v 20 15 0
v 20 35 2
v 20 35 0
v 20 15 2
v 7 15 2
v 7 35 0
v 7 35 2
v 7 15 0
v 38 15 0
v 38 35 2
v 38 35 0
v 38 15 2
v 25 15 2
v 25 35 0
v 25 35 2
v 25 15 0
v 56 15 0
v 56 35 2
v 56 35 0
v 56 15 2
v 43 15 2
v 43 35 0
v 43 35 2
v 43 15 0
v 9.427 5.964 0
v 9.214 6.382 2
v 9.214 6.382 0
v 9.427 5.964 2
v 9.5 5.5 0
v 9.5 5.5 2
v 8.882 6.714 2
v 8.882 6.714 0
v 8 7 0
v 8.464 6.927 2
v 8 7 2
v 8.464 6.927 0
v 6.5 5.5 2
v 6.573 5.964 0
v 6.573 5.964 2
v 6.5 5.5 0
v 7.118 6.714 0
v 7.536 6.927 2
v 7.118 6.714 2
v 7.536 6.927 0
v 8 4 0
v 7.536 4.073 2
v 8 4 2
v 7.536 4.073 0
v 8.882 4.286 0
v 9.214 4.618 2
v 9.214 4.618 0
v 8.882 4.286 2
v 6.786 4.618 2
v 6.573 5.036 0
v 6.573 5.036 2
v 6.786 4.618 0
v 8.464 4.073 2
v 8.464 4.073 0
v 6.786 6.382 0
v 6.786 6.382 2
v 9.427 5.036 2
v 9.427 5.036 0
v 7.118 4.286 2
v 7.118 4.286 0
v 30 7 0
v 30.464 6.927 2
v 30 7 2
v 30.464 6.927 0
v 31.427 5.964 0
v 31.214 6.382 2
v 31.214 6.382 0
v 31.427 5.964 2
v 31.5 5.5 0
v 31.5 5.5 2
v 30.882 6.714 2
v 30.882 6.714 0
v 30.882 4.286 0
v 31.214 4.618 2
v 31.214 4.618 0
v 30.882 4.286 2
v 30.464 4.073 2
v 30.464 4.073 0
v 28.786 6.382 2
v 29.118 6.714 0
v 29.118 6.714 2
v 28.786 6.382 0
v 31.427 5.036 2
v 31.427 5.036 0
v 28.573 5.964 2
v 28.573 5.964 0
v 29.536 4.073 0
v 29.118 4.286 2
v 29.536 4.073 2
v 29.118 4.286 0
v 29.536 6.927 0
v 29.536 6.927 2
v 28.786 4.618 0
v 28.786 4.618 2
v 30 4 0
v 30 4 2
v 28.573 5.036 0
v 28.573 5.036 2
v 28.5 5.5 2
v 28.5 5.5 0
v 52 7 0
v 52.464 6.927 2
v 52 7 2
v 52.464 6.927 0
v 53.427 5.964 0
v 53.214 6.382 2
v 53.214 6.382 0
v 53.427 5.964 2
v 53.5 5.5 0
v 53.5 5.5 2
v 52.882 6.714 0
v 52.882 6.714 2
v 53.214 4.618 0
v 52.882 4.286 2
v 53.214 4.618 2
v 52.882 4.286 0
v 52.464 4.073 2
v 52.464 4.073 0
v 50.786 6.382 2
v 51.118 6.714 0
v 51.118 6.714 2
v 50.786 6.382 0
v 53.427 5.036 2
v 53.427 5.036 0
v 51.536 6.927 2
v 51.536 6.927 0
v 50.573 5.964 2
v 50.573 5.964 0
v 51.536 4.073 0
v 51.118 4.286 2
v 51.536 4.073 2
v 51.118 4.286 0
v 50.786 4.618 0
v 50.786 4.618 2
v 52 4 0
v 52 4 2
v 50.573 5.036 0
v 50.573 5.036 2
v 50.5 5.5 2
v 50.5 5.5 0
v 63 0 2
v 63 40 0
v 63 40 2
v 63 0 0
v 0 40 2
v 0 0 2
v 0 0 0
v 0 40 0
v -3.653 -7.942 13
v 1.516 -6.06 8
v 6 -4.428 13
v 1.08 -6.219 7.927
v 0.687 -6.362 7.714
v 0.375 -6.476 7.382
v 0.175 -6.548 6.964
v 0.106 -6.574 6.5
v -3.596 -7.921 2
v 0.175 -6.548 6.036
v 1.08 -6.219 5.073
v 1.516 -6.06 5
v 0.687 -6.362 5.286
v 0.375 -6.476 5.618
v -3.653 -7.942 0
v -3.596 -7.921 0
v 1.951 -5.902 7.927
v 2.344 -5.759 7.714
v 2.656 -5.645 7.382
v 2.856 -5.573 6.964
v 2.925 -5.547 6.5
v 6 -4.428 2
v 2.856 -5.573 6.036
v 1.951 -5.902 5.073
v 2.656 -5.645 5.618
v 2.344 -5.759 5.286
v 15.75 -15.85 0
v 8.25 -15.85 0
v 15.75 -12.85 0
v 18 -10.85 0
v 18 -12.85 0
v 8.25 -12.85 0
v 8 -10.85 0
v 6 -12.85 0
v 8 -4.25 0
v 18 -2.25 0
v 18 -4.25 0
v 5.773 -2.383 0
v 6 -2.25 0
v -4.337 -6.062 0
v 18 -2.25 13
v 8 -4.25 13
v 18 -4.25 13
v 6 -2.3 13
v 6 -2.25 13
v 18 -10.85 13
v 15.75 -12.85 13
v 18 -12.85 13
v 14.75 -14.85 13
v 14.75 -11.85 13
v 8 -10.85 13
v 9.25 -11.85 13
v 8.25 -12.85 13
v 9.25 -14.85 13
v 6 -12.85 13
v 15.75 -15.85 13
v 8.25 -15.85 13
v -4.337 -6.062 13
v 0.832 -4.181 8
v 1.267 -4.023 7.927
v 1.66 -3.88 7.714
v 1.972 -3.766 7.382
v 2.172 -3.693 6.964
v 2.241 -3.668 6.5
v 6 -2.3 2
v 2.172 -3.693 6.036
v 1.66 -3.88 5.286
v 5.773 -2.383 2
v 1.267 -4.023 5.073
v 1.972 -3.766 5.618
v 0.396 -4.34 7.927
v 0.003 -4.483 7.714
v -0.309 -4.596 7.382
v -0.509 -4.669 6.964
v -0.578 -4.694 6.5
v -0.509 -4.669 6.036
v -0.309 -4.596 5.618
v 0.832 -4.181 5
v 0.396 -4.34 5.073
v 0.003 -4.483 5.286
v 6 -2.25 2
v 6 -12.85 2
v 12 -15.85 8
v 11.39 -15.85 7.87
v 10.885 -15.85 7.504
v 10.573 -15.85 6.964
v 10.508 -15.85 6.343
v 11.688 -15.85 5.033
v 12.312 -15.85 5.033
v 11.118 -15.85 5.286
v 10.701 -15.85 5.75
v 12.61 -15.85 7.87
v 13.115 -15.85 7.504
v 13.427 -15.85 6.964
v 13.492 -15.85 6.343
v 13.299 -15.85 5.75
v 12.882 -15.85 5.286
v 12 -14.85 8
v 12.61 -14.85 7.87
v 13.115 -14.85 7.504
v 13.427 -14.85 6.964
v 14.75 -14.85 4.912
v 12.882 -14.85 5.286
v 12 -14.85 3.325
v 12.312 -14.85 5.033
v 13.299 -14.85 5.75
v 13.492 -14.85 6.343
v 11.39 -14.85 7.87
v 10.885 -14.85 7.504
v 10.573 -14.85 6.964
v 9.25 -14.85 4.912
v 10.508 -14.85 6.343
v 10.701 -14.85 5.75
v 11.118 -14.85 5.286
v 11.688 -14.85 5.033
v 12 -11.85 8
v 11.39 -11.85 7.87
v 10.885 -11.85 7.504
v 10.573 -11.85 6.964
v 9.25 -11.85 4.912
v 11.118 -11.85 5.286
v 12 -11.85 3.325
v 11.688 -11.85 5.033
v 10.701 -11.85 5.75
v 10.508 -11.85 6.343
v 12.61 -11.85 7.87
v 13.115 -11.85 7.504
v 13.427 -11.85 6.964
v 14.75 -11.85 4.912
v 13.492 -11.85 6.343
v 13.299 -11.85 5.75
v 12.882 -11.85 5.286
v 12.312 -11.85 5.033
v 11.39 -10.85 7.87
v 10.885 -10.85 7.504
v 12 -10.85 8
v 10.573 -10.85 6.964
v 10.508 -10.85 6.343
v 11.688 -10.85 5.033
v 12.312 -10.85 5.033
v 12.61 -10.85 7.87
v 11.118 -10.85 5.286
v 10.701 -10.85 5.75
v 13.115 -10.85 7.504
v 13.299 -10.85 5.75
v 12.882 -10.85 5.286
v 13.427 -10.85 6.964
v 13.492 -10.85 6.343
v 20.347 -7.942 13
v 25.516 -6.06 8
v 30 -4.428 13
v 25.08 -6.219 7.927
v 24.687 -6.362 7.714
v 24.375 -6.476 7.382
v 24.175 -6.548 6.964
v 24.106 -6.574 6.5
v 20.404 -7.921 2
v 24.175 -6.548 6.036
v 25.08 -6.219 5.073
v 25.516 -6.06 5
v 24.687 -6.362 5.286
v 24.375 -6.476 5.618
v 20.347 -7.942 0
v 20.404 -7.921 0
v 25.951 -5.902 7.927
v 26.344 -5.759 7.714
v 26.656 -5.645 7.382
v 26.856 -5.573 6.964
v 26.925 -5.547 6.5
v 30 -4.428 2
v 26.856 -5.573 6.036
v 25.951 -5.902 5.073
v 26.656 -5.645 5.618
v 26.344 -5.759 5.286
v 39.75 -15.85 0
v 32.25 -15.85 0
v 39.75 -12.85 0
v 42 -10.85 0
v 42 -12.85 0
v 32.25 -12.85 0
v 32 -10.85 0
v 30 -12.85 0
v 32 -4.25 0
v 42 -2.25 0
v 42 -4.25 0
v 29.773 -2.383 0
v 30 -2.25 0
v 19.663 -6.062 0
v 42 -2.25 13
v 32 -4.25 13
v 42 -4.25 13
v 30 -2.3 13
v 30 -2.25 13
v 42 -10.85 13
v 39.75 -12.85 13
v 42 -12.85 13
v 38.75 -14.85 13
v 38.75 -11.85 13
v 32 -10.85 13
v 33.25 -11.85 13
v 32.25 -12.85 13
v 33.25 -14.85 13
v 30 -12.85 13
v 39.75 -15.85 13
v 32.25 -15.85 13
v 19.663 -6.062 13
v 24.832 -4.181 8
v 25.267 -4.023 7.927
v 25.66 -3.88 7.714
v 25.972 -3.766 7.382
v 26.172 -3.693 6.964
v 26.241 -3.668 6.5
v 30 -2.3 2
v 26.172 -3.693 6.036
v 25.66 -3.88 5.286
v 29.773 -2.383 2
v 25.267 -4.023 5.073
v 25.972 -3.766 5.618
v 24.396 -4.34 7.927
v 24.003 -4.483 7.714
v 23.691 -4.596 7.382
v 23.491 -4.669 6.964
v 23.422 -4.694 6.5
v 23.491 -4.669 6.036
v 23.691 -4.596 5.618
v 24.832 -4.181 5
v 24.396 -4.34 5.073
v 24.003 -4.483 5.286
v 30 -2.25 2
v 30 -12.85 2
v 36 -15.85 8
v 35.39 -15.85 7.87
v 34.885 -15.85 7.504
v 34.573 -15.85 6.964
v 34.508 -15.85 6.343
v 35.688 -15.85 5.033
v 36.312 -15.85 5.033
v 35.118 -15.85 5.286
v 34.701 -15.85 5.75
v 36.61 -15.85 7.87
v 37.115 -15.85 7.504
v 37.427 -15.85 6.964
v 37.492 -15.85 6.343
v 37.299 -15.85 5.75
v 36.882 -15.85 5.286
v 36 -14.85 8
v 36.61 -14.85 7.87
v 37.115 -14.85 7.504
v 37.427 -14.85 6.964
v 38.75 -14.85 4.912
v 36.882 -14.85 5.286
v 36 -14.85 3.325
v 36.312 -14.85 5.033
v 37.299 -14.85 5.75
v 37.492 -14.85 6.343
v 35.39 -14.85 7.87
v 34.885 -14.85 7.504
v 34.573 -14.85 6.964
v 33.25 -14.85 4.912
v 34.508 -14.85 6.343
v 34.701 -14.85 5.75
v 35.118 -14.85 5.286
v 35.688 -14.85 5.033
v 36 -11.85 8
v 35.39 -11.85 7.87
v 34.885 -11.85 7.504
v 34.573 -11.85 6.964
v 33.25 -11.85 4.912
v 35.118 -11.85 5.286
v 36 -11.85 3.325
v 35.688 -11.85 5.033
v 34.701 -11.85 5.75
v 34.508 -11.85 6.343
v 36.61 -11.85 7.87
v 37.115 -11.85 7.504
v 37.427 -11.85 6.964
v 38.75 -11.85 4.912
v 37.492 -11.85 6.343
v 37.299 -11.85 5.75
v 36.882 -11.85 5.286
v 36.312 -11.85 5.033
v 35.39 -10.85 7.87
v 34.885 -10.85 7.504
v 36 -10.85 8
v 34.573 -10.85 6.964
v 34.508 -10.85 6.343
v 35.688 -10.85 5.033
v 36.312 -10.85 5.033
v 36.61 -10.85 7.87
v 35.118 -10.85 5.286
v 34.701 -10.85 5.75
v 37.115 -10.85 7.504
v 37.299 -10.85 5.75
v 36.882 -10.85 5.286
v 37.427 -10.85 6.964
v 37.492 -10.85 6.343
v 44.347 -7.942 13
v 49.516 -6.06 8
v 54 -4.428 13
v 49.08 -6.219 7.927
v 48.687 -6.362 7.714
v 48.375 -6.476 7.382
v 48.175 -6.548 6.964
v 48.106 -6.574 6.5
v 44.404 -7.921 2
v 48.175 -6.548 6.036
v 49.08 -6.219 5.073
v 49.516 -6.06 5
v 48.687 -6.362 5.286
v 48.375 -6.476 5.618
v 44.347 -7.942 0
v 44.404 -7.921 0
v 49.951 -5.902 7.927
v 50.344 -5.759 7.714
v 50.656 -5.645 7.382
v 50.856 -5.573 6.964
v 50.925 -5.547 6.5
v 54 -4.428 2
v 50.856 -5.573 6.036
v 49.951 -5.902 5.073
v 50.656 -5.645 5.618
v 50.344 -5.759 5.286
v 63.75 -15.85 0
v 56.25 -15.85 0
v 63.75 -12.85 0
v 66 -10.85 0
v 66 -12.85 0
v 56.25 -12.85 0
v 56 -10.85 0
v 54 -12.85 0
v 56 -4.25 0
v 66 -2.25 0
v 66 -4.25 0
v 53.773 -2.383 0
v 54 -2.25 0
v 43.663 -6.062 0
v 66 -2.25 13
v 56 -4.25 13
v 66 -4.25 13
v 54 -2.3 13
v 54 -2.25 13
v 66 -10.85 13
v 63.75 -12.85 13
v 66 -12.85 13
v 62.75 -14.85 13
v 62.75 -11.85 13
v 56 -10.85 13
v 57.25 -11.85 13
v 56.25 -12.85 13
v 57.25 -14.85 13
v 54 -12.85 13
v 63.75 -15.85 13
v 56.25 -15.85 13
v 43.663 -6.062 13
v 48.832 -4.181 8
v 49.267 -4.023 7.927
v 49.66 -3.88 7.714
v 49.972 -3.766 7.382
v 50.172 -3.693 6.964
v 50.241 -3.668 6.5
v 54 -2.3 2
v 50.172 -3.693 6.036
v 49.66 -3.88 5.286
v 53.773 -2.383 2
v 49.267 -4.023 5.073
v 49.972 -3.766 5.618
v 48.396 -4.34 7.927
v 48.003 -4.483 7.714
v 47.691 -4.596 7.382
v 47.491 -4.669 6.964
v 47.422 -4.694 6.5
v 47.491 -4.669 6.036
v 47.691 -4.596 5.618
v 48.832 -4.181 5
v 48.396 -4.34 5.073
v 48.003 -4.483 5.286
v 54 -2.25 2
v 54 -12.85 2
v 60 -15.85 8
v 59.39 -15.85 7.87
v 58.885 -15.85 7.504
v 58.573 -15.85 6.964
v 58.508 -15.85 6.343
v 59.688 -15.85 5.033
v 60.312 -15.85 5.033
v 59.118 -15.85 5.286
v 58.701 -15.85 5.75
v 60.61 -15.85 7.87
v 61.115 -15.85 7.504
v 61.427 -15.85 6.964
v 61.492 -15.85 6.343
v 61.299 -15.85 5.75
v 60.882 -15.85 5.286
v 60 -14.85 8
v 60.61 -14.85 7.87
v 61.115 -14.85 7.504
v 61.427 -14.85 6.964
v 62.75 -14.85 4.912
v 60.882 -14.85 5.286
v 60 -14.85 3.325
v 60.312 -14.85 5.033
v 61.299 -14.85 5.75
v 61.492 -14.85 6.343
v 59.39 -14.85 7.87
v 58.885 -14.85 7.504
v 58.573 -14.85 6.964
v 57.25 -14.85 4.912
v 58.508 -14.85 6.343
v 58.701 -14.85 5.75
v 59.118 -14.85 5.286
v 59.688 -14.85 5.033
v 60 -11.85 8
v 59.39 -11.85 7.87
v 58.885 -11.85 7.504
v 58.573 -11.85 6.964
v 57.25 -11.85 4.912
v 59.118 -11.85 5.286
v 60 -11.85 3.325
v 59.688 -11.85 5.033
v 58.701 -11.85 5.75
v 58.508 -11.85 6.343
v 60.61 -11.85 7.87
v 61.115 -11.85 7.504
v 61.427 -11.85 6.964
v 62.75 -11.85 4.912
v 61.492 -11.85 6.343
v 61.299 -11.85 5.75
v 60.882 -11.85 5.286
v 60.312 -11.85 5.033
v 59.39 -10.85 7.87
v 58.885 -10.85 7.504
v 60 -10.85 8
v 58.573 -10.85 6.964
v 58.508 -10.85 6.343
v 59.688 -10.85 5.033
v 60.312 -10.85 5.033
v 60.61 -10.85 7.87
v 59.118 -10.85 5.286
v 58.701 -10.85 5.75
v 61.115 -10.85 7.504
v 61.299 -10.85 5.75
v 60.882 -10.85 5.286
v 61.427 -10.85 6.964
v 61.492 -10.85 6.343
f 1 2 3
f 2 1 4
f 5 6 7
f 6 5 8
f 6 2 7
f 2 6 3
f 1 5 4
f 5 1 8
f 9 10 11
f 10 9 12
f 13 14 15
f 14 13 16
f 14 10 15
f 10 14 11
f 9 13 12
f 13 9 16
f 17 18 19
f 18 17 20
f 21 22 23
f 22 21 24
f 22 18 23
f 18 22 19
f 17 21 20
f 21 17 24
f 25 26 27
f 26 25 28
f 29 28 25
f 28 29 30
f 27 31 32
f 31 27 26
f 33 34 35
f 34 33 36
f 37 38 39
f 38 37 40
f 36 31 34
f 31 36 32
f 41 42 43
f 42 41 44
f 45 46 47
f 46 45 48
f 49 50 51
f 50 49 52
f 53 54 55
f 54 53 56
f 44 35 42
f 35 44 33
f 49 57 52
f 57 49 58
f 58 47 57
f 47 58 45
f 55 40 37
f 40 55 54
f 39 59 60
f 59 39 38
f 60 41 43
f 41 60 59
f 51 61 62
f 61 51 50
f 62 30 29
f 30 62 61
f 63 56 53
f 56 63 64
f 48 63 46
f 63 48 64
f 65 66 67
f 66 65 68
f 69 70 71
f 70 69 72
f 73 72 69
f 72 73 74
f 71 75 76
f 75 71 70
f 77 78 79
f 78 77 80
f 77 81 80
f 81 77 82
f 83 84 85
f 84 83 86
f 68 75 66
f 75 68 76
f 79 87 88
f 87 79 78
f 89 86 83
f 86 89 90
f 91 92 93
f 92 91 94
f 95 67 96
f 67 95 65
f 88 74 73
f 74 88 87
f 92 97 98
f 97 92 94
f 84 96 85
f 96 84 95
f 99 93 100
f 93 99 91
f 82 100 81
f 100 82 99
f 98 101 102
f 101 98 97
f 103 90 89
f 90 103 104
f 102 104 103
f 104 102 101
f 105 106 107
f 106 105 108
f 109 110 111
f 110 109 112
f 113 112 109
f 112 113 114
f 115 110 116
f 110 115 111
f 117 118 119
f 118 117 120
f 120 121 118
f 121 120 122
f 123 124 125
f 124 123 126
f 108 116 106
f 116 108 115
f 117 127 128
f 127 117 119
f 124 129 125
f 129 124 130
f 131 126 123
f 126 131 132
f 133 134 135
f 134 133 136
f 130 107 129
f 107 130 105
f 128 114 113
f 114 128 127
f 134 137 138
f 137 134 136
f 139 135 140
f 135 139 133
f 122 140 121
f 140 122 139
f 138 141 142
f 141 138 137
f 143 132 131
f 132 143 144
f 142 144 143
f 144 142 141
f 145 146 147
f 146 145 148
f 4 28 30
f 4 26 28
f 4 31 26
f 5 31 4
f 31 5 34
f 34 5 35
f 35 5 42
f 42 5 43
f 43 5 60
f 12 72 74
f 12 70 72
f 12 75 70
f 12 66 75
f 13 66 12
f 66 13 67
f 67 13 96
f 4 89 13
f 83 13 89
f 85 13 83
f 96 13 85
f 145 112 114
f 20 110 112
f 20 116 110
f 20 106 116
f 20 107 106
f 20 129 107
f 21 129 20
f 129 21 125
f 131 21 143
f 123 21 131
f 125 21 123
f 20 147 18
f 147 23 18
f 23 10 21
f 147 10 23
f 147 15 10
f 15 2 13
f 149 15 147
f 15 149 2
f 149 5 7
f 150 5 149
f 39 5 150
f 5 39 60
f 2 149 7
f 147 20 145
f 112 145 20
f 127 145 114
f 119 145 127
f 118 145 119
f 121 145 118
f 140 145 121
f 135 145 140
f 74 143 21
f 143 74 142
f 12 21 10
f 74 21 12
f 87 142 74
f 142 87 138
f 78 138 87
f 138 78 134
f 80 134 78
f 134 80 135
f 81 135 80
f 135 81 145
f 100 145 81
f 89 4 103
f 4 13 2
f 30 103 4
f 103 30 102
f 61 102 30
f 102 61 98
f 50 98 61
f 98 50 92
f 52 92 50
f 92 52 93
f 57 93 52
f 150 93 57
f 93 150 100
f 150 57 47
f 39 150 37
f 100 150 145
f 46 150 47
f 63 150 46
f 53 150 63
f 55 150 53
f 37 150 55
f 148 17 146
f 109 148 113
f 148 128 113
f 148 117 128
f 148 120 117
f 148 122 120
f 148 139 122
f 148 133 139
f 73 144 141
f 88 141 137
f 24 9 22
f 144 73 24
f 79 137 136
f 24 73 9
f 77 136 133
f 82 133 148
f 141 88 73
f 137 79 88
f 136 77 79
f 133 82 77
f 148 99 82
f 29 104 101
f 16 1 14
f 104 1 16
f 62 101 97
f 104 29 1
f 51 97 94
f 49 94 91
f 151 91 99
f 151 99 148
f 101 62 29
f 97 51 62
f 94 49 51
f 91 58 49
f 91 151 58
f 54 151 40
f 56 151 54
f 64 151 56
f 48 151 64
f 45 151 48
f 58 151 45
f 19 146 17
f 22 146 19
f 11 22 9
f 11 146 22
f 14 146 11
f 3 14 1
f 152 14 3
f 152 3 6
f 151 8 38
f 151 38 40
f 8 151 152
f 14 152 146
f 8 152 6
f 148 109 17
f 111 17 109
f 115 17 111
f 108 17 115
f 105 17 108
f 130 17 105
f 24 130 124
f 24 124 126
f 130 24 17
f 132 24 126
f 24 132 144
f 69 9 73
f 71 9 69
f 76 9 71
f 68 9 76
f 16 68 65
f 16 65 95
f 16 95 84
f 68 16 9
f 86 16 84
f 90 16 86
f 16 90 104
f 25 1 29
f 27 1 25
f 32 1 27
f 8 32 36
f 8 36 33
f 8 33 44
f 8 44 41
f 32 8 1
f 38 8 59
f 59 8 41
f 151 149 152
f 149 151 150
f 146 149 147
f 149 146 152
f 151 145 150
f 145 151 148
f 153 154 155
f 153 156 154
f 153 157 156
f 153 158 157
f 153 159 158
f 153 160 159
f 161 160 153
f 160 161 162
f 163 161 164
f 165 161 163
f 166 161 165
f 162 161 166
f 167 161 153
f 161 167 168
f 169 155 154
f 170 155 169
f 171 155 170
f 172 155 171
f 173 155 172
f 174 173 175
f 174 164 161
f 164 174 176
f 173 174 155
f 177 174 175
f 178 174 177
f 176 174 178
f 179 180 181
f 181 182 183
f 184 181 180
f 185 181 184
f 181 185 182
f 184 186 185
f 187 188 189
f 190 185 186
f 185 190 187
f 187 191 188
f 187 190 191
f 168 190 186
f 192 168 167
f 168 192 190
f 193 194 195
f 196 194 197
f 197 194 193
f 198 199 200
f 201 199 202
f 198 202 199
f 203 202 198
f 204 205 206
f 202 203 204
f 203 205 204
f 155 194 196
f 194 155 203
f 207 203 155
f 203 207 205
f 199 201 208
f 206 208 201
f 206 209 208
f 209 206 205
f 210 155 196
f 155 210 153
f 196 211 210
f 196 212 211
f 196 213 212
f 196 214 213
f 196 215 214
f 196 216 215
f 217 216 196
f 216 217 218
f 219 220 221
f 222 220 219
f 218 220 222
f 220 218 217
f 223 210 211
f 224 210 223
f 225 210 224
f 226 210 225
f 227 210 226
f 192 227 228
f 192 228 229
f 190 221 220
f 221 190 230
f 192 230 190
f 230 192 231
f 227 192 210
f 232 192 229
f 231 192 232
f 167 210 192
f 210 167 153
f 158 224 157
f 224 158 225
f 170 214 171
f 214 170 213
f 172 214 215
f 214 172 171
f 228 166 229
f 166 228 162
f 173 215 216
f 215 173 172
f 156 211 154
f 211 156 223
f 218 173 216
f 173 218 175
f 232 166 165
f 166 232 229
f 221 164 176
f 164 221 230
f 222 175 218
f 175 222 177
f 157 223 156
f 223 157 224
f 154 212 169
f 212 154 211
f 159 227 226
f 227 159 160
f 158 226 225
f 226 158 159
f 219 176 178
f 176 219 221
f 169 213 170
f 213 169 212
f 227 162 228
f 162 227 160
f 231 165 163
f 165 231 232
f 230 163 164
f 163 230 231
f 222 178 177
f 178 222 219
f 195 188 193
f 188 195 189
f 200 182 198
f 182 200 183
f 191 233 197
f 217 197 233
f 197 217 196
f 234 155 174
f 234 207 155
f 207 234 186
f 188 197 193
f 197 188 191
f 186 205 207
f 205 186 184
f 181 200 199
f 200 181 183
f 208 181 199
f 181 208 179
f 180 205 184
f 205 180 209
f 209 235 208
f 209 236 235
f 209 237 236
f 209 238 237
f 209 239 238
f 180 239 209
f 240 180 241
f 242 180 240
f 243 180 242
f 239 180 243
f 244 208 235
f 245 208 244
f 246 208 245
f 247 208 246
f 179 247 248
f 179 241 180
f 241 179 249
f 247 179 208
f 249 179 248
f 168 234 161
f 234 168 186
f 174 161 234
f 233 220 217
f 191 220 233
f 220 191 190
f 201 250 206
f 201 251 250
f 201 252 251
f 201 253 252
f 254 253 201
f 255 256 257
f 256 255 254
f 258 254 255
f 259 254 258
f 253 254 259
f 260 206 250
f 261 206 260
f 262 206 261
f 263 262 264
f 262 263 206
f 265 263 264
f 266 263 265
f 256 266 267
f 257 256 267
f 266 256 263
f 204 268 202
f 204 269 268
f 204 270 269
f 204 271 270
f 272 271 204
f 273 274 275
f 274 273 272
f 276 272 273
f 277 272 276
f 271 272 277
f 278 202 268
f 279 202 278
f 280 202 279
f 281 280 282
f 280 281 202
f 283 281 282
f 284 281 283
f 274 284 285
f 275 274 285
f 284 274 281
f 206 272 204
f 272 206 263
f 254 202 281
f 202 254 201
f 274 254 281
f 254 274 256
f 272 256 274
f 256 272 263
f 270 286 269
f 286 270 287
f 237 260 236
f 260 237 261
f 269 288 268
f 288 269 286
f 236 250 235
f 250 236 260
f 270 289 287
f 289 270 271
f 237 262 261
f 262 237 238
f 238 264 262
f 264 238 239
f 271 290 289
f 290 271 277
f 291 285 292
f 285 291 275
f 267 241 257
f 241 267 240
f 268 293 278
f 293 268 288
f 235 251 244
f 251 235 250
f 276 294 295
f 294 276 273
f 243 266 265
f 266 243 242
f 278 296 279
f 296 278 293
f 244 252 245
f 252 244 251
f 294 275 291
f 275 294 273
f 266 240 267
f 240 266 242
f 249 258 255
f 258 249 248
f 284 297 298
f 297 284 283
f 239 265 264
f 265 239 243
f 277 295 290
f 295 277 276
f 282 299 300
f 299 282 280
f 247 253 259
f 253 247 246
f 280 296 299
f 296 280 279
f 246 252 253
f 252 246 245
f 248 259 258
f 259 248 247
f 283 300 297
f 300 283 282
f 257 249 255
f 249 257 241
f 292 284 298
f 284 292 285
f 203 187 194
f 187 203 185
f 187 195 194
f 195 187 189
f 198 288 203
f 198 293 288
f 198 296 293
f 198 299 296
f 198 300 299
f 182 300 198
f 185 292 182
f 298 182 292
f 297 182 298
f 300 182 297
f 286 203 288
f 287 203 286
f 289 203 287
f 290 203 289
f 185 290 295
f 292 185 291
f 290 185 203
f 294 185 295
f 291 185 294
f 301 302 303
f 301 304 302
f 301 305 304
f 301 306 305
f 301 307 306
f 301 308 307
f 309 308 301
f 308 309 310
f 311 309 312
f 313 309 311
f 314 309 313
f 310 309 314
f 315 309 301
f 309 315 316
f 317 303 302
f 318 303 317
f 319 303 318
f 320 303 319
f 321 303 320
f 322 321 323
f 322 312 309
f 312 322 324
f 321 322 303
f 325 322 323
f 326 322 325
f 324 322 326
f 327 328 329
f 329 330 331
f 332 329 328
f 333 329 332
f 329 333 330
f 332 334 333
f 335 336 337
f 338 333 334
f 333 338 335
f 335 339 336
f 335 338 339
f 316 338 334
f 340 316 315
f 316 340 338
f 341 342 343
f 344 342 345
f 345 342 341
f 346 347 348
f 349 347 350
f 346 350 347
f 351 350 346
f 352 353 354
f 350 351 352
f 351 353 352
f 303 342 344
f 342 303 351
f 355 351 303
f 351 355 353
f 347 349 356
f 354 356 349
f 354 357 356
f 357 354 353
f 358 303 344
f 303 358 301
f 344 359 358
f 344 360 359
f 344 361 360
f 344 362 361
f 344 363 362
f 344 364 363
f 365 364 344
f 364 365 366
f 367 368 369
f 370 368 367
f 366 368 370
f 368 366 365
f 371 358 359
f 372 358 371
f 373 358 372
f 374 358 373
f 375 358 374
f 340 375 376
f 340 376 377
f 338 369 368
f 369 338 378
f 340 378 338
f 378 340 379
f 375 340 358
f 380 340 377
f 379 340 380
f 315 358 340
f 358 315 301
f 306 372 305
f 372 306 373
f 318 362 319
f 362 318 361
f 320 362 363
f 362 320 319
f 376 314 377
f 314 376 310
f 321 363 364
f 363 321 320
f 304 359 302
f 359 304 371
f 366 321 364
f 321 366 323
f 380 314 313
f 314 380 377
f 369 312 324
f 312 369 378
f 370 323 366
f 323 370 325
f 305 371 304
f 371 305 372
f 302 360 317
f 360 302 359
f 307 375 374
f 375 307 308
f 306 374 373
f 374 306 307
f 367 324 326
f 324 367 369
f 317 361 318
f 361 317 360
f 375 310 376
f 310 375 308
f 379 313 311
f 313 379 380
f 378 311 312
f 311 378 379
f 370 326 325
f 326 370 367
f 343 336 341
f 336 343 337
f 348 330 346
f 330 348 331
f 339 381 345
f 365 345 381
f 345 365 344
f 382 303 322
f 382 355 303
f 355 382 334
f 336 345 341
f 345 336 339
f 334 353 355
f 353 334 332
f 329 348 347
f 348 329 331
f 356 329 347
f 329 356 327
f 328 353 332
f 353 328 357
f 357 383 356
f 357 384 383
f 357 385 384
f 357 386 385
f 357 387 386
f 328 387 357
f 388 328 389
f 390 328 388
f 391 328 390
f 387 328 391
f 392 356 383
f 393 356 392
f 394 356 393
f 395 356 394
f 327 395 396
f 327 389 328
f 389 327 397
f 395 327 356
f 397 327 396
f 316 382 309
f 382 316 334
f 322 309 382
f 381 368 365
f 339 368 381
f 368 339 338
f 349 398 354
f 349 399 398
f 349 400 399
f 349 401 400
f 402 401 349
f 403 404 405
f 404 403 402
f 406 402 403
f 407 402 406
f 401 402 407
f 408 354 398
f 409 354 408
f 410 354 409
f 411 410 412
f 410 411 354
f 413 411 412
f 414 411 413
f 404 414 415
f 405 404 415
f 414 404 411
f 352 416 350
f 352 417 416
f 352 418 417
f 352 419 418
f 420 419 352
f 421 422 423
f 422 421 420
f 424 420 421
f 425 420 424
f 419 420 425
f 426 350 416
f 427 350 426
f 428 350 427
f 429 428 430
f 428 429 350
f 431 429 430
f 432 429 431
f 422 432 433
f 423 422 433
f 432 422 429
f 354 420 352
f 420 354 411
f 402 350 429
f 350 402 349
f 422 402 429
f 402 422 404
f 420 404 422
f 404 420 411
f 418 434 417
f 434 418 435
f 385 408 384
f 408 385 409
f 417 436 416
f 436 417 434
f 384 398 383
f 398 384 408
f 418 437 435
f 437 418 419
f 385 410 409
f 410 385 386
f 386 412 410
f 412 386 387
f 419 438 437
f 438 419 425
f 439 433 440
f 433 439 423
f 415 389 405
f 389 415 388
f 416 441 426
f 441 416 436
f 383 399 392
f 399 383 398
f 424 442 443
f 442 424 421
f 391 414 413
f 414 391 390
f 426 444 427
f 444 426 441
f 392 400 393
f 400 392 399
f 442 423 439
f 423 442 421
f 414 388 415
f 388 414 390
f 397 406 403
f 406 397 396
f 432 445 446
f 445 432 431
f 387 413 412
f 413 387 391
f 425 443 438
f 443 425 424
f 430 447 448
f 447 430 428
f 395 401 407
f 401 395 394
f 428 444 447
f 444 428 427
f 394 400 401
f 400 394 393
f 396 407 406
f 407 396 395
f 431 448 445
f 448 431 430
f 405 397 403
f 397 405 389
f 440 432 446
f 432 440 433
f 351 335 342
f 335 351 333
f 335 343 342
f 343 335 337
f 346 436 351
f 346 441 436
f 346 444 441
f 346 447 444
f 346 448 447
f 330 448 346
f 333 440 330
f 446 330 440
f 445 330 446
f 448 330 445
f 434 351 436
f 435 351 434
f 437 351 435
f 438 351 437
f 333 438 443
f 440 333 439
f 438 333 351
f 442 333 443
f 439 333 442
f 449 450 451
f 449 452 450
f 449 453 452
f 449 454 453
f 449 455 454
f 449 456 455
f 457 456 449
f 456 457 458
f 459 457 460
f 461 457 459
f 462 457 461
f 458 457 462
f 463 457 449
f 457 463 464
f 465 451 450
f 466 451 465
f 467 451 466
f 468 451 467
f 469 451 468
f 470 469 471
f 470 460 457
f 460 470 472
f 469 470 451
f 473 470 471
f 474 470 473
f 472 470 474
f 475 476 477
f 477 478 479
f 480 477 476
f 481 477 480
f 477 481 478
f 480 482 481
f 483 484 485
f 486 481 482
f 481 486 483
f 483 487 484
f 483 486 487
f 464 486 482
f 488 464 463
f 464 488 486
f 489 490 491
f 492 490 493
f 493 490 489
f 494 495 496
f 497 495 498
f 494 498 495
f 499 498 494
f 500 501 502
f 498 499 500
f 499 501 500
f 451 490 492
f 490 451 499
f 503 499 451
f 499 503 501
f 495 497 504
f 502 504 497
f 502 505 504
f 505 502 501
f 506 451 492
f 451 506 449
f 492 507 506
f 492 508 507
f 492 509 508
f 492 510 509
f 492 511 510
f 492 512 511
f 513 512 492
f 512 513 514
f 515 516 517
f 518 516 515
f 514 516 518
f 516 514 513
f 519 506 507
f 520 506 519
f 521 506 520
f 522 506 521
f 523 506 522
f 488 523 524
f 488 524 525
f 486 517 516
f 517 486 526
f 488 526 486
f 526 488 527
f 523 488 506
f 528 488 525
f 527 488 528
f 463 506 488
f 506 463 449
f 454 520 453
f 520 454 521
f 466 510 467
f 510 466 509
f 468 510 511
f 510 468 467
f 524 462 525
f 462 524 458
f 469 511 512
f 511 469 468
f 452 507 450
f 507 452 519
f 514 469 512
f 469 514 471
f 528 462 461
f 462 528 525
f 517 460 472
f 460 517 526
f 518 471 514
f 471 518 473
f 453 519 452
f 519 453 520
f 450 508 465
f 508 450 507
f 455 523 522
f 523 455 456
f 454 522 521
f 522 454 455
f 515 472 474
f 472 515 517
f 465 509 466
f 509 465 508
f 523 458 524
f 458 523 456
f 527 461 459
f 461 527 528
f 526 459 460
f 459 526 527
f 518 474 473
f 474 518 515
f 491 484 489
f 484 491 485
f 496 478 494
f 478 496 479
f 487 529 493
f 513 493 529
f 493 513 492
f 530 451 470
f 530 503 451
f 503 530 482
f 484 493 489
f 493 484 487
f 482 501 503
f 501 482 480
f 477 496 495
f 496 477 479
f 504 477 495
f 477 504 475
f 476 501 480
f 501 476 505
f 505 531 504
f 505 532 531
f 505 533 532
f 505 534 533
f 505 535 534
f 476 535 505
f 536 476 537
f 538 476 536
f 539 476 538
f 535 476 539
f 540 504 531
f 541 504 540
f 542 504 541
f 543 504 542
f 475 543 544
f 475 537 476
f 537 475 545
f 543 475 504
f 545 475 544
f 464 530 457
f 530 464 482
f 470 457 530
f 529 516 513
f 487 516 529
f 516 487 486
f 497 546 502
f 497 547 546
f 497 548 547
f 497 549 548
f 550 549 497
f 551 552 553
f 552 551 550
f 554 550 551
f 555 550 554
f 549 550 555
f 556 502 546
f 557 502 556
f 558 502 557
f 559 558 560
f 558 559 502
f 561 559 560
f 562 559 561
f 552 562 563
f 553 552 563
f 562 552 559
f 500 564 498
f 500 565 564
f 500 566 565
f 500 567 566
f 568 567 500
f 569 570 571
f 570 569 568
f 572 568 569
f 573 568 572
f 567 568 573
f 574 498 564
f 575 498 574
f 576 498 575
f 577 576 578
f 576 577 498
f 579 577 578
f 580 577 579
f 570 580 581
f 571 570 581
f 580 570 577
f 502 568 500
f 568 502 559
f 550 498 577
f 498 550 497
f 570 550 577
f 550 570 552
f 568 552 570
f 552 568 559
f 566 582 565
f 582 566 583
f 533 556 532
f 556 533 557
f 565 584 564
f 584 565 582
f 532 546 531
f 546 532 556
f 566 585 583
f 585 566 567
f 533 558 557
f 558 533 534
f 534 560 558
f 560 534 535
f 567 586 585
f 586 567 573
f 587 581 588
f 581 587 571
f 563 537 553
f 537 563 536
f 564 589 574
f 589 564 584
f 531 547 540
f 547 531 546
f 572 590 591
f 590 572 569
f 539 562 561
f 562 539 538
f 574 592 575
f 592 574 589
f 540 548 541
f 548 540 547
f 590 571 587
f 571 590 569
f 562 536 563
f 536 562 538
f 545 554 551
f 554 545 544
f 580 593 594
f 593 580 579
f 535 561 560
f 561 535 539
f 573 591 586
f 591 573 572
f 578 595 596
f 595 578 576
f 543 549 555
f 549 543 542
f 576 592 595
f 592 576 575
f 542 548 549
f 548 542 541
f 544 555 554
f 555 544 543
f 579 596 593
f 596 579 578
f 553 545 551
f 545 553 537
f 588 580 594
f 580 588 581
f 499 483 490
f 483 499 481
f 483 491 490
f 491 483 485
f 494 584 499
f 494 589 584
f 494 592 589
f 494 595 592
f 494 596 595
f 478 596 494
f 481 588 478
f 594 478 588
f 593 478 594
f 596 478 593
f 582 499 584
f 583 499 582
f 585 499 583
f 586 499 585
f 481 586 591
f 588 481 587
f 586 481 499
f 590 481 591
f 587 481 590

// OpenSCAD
/*
 * Rocker Switch Panel, v0.42
 *
 * by Alex Franke (CodeCreations), Feb 2014
 * http://www.theFrankes.com
 * 
 * Licenced under Creative Commons Attribution - Non-Commercial - Share Alike 3.0 
 * 
 * INSTRUCTIONS: Choose some values in the "User-defined values" section, and render. 
 * 
 * v1.00, Mar 7, 2014: Supports angles between 90-180, suggested by MyMakibox 
 * v0.42, Feb 1, 2014: Initial Release.
 */
 
/////////////////////////////////////////////////////////////////////////////
// User-defined values... 
/////////////////////////////////////////////////////////////////////////////
 
/* [General Properties] */

// The thickness of the material (switch panel, clip, etc)
thickness = 2;

// The in-diameter of mounting nut (flat to flat)
nutInDiameter = 5.5; 

// The height of the mounting nut
nutHeight = 2.5; 

// The diameter of the screw holes 
screwHoleDiameter = 3; 

// Curve quality
$fn = 20;


/* [Switch Properties] */

// How many rows of switches? 
rows = 1; 

// How many columns of switches? 
columns = 3; 

// The width of the switch opening
switchWidth = 13;

// The length of the switch opening
switchLength = 20; 


/* [Mounting Clip Properties] */

// The angle of the mounted panel 
angle = 70; 

// The number of mounting clips
mountingClips = 3; 

// The distance between the mounting clips and the edges of the panel 
mountingClipMargin = 3;

// The width of the clip that attaches to the board
clipWidth = 13;

// The thickness of the board you're mounting the clips onto
boardWidth = 6.6; 

// The length that the clips extend over the board
boardClampLength = 10; 

// The length of the extender tab that you mount the panel to
extenderLength = 11; 


/* [Spacing] */

// The amount of space between each column of switches (X direction) 
xSwitchPadding = 5;

// The amount of space between each row of switches (Y direction) 
ySwitchPadding = 6;

// The amount of space between the switches and the left and right edges of the panel
xMargin = 7;  

// The amount of space between the switches and the top and bottom edges of the panel
yMargin = 5;  

// How much space to leave for labels
labelPadding = 10; 

// Should label space go below the switch or above it?
labelBelow = true;


/////////////////////////////////////////////////////////////////////////////
// The code... 
/////////////////////////////////////////////////////////////////////////////

rockerSwitchPanel();

yOffset = ( angle < 90 ) ? 0 : extenderLength * cos(180-angle);

translate([
	(thickness+boardClampLength+extenderLength+1)/2,
	-((thickness*2+boardWidth+nutHeight)/2)-1 - yOffset,
	clipWidth/2
	]) 
for ( i=[0:mountingClips-1] ) {
	translate([(thickness+boardClampLength+extenderLength+1)*i,0,0]) 
	mount();
}


/////////////////////////////////////////////////////////////////////////////
// Modules... 
/////////////////////////////////////////////////////////////////////////////

module rockerSwitchPanel() {

	panelSize = [
		columns*switchWidth + xSwitchPadding*(columns-1) + xMargin*2,
		rows*(switchLength+labelPadding) + ySwitchPadding*(rows-1) + yMargin*2,
		thickness
		];
	clipSeperation = (panelSize[0] - 2*mountingClipMargin - mountingClips*clipWidth)
		/(mountingClips-1);

	union() {

		// mounting clips
*		translate([
			mountingClipMargin+boardClampLength/2,
			(thickness*2+boardWidth)/2,
			-(thickness+boardClampLength)/2
		]) 
		for ( i=[0:mountingClips-1] ) { 
			translate([i*(clipSeperation+clipWidth),0,0]) 
			rotate([0,90,180]) 
			mount(); 
		}

		// panel
		//	rotate([angle,0,0]) 
		difference() {
			cube(panelSize);
			
			translate([xMargin,yMargin+(labelBelow?labelPadding:0),-0.5]) 
			for( i=[0:columns-1], j=[0:rows-1] ) {
				translate([
					i*(switchWidth+xSwitchPadding),
					j*(switchLength+ySwitchPadding+labelPadding),
					0]) 		
				 	cube([switchWidth, switchLength, thickness+1]);
			}

			// mounting holes 
			translate([
				mountingClipMargin+boardClampLength/2,
				extenderLength/2,
				-0.5
				])
			for ( i=[0:mountingClips-1] ) { 
				translate([i*(clipSeperation+clipWidth),0,0]) 
				cylinder( h=thickness+1, r= screwHoleDiameter/2);
			}
		}
	}
}

module mount () {

	boxSize = [thickness+boardClampLength,thickness*2+boardWidth,clipWidth]; 

	difference() {
		union() {
			cube(boxSize, center=true); 
			translate([0,-boardWidth/2-((nutHeight + 0.5)+thickness)/2,0]) 
				cube([nutInDiameter+thickness,(nutHeight + 0.5)+thickness,clipWidth], center=true); 

			translate([-boxSize[0]/2,boxSize[1]/2-0.05,clipWidth/2]) 
			rotate([180,0,-angle]) 
			difference() {
				union() {
					cube([thickness,extenderLength,clipWidth], center=false); 
					if ( angle > 90 ) 
						translate([0,-thickness+0.05,0]) 
						cube([thickness,thickness,clipWidth], center=false); 
				}
				translate([-0.5,extenderLength/2,clipWidth/2]) 
				rotate([0,90,0]) 
				cylinder(h=thickness+1, r=screwHoleDiameter/2);
			}

			translate([0,0,-clipWidth/2]) 
			linear_extrude( height=thickness ) 
				polygon( points=[
					[-boxSize[0]/2,-boxSize[1]/2],
					[-boxSize[0]/2,boxSize[1]/2],
					[-boxSize[0]/2-extenderLength*sin(angle)+thickness*sin(90-angle),
						boxSize[1]/2-extenderLength*cos(angle)-thickness*cos(90-angle)]
					] ); 

		}
		translate([thickness,0,0]) 
			cube([boxSize[0],boardWidth,clipWidth+1], center=true); 

		translate([0,-(boardWidth/2 + (nutHeight + 0.5)/2 + thickness/2),0])
		rotate([90,-90,0]) 
		captiveNut( [nutInDiameter,nutHeight + 0.5], setScrewHoleDiameter=screwHoleDiameter, 
			depth=10, holeLengthTop=5, holeLengthBottom=5 );
	}
}


// This is the captive nut module I use in several of my designs. 
module captiveNut( nutSize, setScrewHoleDiameter=3, 
	depth=10, holeLengthTop=5, holeLengthBottom=5 )
{
	render()
	union() {
		nut( nutSize ); 
	
		if ( depth > 0 ) 
			translate([depth/2,0,0]) 
				cube( [depth, nutSize[0], nutSize[1]], center=true );
	
		translate([0,0,-(nutSize[1]/2)-holeLengthBottom]) 
			cylinder(r=setScrewHoleDiameter/2, h=nutSize[1]+holeLengthTop+holeLengthBottom, $fn=15);
	}
}

// nutSize = [inDiameter,thickness]
// (Yes, it's a little nutty.)
module nut( nutSize ) { 
	side = nutSize[0] * tan( 180/6 );
	if ( nutSize[0] * nutSize[1] != 0 ) {
		for ( i = [0 : 2] ) {
			rotate( i*120, [0, 0, 1]) 
				cube( [side, nutSize[0], nutSize[1]], center=true );
		}
	}
}
